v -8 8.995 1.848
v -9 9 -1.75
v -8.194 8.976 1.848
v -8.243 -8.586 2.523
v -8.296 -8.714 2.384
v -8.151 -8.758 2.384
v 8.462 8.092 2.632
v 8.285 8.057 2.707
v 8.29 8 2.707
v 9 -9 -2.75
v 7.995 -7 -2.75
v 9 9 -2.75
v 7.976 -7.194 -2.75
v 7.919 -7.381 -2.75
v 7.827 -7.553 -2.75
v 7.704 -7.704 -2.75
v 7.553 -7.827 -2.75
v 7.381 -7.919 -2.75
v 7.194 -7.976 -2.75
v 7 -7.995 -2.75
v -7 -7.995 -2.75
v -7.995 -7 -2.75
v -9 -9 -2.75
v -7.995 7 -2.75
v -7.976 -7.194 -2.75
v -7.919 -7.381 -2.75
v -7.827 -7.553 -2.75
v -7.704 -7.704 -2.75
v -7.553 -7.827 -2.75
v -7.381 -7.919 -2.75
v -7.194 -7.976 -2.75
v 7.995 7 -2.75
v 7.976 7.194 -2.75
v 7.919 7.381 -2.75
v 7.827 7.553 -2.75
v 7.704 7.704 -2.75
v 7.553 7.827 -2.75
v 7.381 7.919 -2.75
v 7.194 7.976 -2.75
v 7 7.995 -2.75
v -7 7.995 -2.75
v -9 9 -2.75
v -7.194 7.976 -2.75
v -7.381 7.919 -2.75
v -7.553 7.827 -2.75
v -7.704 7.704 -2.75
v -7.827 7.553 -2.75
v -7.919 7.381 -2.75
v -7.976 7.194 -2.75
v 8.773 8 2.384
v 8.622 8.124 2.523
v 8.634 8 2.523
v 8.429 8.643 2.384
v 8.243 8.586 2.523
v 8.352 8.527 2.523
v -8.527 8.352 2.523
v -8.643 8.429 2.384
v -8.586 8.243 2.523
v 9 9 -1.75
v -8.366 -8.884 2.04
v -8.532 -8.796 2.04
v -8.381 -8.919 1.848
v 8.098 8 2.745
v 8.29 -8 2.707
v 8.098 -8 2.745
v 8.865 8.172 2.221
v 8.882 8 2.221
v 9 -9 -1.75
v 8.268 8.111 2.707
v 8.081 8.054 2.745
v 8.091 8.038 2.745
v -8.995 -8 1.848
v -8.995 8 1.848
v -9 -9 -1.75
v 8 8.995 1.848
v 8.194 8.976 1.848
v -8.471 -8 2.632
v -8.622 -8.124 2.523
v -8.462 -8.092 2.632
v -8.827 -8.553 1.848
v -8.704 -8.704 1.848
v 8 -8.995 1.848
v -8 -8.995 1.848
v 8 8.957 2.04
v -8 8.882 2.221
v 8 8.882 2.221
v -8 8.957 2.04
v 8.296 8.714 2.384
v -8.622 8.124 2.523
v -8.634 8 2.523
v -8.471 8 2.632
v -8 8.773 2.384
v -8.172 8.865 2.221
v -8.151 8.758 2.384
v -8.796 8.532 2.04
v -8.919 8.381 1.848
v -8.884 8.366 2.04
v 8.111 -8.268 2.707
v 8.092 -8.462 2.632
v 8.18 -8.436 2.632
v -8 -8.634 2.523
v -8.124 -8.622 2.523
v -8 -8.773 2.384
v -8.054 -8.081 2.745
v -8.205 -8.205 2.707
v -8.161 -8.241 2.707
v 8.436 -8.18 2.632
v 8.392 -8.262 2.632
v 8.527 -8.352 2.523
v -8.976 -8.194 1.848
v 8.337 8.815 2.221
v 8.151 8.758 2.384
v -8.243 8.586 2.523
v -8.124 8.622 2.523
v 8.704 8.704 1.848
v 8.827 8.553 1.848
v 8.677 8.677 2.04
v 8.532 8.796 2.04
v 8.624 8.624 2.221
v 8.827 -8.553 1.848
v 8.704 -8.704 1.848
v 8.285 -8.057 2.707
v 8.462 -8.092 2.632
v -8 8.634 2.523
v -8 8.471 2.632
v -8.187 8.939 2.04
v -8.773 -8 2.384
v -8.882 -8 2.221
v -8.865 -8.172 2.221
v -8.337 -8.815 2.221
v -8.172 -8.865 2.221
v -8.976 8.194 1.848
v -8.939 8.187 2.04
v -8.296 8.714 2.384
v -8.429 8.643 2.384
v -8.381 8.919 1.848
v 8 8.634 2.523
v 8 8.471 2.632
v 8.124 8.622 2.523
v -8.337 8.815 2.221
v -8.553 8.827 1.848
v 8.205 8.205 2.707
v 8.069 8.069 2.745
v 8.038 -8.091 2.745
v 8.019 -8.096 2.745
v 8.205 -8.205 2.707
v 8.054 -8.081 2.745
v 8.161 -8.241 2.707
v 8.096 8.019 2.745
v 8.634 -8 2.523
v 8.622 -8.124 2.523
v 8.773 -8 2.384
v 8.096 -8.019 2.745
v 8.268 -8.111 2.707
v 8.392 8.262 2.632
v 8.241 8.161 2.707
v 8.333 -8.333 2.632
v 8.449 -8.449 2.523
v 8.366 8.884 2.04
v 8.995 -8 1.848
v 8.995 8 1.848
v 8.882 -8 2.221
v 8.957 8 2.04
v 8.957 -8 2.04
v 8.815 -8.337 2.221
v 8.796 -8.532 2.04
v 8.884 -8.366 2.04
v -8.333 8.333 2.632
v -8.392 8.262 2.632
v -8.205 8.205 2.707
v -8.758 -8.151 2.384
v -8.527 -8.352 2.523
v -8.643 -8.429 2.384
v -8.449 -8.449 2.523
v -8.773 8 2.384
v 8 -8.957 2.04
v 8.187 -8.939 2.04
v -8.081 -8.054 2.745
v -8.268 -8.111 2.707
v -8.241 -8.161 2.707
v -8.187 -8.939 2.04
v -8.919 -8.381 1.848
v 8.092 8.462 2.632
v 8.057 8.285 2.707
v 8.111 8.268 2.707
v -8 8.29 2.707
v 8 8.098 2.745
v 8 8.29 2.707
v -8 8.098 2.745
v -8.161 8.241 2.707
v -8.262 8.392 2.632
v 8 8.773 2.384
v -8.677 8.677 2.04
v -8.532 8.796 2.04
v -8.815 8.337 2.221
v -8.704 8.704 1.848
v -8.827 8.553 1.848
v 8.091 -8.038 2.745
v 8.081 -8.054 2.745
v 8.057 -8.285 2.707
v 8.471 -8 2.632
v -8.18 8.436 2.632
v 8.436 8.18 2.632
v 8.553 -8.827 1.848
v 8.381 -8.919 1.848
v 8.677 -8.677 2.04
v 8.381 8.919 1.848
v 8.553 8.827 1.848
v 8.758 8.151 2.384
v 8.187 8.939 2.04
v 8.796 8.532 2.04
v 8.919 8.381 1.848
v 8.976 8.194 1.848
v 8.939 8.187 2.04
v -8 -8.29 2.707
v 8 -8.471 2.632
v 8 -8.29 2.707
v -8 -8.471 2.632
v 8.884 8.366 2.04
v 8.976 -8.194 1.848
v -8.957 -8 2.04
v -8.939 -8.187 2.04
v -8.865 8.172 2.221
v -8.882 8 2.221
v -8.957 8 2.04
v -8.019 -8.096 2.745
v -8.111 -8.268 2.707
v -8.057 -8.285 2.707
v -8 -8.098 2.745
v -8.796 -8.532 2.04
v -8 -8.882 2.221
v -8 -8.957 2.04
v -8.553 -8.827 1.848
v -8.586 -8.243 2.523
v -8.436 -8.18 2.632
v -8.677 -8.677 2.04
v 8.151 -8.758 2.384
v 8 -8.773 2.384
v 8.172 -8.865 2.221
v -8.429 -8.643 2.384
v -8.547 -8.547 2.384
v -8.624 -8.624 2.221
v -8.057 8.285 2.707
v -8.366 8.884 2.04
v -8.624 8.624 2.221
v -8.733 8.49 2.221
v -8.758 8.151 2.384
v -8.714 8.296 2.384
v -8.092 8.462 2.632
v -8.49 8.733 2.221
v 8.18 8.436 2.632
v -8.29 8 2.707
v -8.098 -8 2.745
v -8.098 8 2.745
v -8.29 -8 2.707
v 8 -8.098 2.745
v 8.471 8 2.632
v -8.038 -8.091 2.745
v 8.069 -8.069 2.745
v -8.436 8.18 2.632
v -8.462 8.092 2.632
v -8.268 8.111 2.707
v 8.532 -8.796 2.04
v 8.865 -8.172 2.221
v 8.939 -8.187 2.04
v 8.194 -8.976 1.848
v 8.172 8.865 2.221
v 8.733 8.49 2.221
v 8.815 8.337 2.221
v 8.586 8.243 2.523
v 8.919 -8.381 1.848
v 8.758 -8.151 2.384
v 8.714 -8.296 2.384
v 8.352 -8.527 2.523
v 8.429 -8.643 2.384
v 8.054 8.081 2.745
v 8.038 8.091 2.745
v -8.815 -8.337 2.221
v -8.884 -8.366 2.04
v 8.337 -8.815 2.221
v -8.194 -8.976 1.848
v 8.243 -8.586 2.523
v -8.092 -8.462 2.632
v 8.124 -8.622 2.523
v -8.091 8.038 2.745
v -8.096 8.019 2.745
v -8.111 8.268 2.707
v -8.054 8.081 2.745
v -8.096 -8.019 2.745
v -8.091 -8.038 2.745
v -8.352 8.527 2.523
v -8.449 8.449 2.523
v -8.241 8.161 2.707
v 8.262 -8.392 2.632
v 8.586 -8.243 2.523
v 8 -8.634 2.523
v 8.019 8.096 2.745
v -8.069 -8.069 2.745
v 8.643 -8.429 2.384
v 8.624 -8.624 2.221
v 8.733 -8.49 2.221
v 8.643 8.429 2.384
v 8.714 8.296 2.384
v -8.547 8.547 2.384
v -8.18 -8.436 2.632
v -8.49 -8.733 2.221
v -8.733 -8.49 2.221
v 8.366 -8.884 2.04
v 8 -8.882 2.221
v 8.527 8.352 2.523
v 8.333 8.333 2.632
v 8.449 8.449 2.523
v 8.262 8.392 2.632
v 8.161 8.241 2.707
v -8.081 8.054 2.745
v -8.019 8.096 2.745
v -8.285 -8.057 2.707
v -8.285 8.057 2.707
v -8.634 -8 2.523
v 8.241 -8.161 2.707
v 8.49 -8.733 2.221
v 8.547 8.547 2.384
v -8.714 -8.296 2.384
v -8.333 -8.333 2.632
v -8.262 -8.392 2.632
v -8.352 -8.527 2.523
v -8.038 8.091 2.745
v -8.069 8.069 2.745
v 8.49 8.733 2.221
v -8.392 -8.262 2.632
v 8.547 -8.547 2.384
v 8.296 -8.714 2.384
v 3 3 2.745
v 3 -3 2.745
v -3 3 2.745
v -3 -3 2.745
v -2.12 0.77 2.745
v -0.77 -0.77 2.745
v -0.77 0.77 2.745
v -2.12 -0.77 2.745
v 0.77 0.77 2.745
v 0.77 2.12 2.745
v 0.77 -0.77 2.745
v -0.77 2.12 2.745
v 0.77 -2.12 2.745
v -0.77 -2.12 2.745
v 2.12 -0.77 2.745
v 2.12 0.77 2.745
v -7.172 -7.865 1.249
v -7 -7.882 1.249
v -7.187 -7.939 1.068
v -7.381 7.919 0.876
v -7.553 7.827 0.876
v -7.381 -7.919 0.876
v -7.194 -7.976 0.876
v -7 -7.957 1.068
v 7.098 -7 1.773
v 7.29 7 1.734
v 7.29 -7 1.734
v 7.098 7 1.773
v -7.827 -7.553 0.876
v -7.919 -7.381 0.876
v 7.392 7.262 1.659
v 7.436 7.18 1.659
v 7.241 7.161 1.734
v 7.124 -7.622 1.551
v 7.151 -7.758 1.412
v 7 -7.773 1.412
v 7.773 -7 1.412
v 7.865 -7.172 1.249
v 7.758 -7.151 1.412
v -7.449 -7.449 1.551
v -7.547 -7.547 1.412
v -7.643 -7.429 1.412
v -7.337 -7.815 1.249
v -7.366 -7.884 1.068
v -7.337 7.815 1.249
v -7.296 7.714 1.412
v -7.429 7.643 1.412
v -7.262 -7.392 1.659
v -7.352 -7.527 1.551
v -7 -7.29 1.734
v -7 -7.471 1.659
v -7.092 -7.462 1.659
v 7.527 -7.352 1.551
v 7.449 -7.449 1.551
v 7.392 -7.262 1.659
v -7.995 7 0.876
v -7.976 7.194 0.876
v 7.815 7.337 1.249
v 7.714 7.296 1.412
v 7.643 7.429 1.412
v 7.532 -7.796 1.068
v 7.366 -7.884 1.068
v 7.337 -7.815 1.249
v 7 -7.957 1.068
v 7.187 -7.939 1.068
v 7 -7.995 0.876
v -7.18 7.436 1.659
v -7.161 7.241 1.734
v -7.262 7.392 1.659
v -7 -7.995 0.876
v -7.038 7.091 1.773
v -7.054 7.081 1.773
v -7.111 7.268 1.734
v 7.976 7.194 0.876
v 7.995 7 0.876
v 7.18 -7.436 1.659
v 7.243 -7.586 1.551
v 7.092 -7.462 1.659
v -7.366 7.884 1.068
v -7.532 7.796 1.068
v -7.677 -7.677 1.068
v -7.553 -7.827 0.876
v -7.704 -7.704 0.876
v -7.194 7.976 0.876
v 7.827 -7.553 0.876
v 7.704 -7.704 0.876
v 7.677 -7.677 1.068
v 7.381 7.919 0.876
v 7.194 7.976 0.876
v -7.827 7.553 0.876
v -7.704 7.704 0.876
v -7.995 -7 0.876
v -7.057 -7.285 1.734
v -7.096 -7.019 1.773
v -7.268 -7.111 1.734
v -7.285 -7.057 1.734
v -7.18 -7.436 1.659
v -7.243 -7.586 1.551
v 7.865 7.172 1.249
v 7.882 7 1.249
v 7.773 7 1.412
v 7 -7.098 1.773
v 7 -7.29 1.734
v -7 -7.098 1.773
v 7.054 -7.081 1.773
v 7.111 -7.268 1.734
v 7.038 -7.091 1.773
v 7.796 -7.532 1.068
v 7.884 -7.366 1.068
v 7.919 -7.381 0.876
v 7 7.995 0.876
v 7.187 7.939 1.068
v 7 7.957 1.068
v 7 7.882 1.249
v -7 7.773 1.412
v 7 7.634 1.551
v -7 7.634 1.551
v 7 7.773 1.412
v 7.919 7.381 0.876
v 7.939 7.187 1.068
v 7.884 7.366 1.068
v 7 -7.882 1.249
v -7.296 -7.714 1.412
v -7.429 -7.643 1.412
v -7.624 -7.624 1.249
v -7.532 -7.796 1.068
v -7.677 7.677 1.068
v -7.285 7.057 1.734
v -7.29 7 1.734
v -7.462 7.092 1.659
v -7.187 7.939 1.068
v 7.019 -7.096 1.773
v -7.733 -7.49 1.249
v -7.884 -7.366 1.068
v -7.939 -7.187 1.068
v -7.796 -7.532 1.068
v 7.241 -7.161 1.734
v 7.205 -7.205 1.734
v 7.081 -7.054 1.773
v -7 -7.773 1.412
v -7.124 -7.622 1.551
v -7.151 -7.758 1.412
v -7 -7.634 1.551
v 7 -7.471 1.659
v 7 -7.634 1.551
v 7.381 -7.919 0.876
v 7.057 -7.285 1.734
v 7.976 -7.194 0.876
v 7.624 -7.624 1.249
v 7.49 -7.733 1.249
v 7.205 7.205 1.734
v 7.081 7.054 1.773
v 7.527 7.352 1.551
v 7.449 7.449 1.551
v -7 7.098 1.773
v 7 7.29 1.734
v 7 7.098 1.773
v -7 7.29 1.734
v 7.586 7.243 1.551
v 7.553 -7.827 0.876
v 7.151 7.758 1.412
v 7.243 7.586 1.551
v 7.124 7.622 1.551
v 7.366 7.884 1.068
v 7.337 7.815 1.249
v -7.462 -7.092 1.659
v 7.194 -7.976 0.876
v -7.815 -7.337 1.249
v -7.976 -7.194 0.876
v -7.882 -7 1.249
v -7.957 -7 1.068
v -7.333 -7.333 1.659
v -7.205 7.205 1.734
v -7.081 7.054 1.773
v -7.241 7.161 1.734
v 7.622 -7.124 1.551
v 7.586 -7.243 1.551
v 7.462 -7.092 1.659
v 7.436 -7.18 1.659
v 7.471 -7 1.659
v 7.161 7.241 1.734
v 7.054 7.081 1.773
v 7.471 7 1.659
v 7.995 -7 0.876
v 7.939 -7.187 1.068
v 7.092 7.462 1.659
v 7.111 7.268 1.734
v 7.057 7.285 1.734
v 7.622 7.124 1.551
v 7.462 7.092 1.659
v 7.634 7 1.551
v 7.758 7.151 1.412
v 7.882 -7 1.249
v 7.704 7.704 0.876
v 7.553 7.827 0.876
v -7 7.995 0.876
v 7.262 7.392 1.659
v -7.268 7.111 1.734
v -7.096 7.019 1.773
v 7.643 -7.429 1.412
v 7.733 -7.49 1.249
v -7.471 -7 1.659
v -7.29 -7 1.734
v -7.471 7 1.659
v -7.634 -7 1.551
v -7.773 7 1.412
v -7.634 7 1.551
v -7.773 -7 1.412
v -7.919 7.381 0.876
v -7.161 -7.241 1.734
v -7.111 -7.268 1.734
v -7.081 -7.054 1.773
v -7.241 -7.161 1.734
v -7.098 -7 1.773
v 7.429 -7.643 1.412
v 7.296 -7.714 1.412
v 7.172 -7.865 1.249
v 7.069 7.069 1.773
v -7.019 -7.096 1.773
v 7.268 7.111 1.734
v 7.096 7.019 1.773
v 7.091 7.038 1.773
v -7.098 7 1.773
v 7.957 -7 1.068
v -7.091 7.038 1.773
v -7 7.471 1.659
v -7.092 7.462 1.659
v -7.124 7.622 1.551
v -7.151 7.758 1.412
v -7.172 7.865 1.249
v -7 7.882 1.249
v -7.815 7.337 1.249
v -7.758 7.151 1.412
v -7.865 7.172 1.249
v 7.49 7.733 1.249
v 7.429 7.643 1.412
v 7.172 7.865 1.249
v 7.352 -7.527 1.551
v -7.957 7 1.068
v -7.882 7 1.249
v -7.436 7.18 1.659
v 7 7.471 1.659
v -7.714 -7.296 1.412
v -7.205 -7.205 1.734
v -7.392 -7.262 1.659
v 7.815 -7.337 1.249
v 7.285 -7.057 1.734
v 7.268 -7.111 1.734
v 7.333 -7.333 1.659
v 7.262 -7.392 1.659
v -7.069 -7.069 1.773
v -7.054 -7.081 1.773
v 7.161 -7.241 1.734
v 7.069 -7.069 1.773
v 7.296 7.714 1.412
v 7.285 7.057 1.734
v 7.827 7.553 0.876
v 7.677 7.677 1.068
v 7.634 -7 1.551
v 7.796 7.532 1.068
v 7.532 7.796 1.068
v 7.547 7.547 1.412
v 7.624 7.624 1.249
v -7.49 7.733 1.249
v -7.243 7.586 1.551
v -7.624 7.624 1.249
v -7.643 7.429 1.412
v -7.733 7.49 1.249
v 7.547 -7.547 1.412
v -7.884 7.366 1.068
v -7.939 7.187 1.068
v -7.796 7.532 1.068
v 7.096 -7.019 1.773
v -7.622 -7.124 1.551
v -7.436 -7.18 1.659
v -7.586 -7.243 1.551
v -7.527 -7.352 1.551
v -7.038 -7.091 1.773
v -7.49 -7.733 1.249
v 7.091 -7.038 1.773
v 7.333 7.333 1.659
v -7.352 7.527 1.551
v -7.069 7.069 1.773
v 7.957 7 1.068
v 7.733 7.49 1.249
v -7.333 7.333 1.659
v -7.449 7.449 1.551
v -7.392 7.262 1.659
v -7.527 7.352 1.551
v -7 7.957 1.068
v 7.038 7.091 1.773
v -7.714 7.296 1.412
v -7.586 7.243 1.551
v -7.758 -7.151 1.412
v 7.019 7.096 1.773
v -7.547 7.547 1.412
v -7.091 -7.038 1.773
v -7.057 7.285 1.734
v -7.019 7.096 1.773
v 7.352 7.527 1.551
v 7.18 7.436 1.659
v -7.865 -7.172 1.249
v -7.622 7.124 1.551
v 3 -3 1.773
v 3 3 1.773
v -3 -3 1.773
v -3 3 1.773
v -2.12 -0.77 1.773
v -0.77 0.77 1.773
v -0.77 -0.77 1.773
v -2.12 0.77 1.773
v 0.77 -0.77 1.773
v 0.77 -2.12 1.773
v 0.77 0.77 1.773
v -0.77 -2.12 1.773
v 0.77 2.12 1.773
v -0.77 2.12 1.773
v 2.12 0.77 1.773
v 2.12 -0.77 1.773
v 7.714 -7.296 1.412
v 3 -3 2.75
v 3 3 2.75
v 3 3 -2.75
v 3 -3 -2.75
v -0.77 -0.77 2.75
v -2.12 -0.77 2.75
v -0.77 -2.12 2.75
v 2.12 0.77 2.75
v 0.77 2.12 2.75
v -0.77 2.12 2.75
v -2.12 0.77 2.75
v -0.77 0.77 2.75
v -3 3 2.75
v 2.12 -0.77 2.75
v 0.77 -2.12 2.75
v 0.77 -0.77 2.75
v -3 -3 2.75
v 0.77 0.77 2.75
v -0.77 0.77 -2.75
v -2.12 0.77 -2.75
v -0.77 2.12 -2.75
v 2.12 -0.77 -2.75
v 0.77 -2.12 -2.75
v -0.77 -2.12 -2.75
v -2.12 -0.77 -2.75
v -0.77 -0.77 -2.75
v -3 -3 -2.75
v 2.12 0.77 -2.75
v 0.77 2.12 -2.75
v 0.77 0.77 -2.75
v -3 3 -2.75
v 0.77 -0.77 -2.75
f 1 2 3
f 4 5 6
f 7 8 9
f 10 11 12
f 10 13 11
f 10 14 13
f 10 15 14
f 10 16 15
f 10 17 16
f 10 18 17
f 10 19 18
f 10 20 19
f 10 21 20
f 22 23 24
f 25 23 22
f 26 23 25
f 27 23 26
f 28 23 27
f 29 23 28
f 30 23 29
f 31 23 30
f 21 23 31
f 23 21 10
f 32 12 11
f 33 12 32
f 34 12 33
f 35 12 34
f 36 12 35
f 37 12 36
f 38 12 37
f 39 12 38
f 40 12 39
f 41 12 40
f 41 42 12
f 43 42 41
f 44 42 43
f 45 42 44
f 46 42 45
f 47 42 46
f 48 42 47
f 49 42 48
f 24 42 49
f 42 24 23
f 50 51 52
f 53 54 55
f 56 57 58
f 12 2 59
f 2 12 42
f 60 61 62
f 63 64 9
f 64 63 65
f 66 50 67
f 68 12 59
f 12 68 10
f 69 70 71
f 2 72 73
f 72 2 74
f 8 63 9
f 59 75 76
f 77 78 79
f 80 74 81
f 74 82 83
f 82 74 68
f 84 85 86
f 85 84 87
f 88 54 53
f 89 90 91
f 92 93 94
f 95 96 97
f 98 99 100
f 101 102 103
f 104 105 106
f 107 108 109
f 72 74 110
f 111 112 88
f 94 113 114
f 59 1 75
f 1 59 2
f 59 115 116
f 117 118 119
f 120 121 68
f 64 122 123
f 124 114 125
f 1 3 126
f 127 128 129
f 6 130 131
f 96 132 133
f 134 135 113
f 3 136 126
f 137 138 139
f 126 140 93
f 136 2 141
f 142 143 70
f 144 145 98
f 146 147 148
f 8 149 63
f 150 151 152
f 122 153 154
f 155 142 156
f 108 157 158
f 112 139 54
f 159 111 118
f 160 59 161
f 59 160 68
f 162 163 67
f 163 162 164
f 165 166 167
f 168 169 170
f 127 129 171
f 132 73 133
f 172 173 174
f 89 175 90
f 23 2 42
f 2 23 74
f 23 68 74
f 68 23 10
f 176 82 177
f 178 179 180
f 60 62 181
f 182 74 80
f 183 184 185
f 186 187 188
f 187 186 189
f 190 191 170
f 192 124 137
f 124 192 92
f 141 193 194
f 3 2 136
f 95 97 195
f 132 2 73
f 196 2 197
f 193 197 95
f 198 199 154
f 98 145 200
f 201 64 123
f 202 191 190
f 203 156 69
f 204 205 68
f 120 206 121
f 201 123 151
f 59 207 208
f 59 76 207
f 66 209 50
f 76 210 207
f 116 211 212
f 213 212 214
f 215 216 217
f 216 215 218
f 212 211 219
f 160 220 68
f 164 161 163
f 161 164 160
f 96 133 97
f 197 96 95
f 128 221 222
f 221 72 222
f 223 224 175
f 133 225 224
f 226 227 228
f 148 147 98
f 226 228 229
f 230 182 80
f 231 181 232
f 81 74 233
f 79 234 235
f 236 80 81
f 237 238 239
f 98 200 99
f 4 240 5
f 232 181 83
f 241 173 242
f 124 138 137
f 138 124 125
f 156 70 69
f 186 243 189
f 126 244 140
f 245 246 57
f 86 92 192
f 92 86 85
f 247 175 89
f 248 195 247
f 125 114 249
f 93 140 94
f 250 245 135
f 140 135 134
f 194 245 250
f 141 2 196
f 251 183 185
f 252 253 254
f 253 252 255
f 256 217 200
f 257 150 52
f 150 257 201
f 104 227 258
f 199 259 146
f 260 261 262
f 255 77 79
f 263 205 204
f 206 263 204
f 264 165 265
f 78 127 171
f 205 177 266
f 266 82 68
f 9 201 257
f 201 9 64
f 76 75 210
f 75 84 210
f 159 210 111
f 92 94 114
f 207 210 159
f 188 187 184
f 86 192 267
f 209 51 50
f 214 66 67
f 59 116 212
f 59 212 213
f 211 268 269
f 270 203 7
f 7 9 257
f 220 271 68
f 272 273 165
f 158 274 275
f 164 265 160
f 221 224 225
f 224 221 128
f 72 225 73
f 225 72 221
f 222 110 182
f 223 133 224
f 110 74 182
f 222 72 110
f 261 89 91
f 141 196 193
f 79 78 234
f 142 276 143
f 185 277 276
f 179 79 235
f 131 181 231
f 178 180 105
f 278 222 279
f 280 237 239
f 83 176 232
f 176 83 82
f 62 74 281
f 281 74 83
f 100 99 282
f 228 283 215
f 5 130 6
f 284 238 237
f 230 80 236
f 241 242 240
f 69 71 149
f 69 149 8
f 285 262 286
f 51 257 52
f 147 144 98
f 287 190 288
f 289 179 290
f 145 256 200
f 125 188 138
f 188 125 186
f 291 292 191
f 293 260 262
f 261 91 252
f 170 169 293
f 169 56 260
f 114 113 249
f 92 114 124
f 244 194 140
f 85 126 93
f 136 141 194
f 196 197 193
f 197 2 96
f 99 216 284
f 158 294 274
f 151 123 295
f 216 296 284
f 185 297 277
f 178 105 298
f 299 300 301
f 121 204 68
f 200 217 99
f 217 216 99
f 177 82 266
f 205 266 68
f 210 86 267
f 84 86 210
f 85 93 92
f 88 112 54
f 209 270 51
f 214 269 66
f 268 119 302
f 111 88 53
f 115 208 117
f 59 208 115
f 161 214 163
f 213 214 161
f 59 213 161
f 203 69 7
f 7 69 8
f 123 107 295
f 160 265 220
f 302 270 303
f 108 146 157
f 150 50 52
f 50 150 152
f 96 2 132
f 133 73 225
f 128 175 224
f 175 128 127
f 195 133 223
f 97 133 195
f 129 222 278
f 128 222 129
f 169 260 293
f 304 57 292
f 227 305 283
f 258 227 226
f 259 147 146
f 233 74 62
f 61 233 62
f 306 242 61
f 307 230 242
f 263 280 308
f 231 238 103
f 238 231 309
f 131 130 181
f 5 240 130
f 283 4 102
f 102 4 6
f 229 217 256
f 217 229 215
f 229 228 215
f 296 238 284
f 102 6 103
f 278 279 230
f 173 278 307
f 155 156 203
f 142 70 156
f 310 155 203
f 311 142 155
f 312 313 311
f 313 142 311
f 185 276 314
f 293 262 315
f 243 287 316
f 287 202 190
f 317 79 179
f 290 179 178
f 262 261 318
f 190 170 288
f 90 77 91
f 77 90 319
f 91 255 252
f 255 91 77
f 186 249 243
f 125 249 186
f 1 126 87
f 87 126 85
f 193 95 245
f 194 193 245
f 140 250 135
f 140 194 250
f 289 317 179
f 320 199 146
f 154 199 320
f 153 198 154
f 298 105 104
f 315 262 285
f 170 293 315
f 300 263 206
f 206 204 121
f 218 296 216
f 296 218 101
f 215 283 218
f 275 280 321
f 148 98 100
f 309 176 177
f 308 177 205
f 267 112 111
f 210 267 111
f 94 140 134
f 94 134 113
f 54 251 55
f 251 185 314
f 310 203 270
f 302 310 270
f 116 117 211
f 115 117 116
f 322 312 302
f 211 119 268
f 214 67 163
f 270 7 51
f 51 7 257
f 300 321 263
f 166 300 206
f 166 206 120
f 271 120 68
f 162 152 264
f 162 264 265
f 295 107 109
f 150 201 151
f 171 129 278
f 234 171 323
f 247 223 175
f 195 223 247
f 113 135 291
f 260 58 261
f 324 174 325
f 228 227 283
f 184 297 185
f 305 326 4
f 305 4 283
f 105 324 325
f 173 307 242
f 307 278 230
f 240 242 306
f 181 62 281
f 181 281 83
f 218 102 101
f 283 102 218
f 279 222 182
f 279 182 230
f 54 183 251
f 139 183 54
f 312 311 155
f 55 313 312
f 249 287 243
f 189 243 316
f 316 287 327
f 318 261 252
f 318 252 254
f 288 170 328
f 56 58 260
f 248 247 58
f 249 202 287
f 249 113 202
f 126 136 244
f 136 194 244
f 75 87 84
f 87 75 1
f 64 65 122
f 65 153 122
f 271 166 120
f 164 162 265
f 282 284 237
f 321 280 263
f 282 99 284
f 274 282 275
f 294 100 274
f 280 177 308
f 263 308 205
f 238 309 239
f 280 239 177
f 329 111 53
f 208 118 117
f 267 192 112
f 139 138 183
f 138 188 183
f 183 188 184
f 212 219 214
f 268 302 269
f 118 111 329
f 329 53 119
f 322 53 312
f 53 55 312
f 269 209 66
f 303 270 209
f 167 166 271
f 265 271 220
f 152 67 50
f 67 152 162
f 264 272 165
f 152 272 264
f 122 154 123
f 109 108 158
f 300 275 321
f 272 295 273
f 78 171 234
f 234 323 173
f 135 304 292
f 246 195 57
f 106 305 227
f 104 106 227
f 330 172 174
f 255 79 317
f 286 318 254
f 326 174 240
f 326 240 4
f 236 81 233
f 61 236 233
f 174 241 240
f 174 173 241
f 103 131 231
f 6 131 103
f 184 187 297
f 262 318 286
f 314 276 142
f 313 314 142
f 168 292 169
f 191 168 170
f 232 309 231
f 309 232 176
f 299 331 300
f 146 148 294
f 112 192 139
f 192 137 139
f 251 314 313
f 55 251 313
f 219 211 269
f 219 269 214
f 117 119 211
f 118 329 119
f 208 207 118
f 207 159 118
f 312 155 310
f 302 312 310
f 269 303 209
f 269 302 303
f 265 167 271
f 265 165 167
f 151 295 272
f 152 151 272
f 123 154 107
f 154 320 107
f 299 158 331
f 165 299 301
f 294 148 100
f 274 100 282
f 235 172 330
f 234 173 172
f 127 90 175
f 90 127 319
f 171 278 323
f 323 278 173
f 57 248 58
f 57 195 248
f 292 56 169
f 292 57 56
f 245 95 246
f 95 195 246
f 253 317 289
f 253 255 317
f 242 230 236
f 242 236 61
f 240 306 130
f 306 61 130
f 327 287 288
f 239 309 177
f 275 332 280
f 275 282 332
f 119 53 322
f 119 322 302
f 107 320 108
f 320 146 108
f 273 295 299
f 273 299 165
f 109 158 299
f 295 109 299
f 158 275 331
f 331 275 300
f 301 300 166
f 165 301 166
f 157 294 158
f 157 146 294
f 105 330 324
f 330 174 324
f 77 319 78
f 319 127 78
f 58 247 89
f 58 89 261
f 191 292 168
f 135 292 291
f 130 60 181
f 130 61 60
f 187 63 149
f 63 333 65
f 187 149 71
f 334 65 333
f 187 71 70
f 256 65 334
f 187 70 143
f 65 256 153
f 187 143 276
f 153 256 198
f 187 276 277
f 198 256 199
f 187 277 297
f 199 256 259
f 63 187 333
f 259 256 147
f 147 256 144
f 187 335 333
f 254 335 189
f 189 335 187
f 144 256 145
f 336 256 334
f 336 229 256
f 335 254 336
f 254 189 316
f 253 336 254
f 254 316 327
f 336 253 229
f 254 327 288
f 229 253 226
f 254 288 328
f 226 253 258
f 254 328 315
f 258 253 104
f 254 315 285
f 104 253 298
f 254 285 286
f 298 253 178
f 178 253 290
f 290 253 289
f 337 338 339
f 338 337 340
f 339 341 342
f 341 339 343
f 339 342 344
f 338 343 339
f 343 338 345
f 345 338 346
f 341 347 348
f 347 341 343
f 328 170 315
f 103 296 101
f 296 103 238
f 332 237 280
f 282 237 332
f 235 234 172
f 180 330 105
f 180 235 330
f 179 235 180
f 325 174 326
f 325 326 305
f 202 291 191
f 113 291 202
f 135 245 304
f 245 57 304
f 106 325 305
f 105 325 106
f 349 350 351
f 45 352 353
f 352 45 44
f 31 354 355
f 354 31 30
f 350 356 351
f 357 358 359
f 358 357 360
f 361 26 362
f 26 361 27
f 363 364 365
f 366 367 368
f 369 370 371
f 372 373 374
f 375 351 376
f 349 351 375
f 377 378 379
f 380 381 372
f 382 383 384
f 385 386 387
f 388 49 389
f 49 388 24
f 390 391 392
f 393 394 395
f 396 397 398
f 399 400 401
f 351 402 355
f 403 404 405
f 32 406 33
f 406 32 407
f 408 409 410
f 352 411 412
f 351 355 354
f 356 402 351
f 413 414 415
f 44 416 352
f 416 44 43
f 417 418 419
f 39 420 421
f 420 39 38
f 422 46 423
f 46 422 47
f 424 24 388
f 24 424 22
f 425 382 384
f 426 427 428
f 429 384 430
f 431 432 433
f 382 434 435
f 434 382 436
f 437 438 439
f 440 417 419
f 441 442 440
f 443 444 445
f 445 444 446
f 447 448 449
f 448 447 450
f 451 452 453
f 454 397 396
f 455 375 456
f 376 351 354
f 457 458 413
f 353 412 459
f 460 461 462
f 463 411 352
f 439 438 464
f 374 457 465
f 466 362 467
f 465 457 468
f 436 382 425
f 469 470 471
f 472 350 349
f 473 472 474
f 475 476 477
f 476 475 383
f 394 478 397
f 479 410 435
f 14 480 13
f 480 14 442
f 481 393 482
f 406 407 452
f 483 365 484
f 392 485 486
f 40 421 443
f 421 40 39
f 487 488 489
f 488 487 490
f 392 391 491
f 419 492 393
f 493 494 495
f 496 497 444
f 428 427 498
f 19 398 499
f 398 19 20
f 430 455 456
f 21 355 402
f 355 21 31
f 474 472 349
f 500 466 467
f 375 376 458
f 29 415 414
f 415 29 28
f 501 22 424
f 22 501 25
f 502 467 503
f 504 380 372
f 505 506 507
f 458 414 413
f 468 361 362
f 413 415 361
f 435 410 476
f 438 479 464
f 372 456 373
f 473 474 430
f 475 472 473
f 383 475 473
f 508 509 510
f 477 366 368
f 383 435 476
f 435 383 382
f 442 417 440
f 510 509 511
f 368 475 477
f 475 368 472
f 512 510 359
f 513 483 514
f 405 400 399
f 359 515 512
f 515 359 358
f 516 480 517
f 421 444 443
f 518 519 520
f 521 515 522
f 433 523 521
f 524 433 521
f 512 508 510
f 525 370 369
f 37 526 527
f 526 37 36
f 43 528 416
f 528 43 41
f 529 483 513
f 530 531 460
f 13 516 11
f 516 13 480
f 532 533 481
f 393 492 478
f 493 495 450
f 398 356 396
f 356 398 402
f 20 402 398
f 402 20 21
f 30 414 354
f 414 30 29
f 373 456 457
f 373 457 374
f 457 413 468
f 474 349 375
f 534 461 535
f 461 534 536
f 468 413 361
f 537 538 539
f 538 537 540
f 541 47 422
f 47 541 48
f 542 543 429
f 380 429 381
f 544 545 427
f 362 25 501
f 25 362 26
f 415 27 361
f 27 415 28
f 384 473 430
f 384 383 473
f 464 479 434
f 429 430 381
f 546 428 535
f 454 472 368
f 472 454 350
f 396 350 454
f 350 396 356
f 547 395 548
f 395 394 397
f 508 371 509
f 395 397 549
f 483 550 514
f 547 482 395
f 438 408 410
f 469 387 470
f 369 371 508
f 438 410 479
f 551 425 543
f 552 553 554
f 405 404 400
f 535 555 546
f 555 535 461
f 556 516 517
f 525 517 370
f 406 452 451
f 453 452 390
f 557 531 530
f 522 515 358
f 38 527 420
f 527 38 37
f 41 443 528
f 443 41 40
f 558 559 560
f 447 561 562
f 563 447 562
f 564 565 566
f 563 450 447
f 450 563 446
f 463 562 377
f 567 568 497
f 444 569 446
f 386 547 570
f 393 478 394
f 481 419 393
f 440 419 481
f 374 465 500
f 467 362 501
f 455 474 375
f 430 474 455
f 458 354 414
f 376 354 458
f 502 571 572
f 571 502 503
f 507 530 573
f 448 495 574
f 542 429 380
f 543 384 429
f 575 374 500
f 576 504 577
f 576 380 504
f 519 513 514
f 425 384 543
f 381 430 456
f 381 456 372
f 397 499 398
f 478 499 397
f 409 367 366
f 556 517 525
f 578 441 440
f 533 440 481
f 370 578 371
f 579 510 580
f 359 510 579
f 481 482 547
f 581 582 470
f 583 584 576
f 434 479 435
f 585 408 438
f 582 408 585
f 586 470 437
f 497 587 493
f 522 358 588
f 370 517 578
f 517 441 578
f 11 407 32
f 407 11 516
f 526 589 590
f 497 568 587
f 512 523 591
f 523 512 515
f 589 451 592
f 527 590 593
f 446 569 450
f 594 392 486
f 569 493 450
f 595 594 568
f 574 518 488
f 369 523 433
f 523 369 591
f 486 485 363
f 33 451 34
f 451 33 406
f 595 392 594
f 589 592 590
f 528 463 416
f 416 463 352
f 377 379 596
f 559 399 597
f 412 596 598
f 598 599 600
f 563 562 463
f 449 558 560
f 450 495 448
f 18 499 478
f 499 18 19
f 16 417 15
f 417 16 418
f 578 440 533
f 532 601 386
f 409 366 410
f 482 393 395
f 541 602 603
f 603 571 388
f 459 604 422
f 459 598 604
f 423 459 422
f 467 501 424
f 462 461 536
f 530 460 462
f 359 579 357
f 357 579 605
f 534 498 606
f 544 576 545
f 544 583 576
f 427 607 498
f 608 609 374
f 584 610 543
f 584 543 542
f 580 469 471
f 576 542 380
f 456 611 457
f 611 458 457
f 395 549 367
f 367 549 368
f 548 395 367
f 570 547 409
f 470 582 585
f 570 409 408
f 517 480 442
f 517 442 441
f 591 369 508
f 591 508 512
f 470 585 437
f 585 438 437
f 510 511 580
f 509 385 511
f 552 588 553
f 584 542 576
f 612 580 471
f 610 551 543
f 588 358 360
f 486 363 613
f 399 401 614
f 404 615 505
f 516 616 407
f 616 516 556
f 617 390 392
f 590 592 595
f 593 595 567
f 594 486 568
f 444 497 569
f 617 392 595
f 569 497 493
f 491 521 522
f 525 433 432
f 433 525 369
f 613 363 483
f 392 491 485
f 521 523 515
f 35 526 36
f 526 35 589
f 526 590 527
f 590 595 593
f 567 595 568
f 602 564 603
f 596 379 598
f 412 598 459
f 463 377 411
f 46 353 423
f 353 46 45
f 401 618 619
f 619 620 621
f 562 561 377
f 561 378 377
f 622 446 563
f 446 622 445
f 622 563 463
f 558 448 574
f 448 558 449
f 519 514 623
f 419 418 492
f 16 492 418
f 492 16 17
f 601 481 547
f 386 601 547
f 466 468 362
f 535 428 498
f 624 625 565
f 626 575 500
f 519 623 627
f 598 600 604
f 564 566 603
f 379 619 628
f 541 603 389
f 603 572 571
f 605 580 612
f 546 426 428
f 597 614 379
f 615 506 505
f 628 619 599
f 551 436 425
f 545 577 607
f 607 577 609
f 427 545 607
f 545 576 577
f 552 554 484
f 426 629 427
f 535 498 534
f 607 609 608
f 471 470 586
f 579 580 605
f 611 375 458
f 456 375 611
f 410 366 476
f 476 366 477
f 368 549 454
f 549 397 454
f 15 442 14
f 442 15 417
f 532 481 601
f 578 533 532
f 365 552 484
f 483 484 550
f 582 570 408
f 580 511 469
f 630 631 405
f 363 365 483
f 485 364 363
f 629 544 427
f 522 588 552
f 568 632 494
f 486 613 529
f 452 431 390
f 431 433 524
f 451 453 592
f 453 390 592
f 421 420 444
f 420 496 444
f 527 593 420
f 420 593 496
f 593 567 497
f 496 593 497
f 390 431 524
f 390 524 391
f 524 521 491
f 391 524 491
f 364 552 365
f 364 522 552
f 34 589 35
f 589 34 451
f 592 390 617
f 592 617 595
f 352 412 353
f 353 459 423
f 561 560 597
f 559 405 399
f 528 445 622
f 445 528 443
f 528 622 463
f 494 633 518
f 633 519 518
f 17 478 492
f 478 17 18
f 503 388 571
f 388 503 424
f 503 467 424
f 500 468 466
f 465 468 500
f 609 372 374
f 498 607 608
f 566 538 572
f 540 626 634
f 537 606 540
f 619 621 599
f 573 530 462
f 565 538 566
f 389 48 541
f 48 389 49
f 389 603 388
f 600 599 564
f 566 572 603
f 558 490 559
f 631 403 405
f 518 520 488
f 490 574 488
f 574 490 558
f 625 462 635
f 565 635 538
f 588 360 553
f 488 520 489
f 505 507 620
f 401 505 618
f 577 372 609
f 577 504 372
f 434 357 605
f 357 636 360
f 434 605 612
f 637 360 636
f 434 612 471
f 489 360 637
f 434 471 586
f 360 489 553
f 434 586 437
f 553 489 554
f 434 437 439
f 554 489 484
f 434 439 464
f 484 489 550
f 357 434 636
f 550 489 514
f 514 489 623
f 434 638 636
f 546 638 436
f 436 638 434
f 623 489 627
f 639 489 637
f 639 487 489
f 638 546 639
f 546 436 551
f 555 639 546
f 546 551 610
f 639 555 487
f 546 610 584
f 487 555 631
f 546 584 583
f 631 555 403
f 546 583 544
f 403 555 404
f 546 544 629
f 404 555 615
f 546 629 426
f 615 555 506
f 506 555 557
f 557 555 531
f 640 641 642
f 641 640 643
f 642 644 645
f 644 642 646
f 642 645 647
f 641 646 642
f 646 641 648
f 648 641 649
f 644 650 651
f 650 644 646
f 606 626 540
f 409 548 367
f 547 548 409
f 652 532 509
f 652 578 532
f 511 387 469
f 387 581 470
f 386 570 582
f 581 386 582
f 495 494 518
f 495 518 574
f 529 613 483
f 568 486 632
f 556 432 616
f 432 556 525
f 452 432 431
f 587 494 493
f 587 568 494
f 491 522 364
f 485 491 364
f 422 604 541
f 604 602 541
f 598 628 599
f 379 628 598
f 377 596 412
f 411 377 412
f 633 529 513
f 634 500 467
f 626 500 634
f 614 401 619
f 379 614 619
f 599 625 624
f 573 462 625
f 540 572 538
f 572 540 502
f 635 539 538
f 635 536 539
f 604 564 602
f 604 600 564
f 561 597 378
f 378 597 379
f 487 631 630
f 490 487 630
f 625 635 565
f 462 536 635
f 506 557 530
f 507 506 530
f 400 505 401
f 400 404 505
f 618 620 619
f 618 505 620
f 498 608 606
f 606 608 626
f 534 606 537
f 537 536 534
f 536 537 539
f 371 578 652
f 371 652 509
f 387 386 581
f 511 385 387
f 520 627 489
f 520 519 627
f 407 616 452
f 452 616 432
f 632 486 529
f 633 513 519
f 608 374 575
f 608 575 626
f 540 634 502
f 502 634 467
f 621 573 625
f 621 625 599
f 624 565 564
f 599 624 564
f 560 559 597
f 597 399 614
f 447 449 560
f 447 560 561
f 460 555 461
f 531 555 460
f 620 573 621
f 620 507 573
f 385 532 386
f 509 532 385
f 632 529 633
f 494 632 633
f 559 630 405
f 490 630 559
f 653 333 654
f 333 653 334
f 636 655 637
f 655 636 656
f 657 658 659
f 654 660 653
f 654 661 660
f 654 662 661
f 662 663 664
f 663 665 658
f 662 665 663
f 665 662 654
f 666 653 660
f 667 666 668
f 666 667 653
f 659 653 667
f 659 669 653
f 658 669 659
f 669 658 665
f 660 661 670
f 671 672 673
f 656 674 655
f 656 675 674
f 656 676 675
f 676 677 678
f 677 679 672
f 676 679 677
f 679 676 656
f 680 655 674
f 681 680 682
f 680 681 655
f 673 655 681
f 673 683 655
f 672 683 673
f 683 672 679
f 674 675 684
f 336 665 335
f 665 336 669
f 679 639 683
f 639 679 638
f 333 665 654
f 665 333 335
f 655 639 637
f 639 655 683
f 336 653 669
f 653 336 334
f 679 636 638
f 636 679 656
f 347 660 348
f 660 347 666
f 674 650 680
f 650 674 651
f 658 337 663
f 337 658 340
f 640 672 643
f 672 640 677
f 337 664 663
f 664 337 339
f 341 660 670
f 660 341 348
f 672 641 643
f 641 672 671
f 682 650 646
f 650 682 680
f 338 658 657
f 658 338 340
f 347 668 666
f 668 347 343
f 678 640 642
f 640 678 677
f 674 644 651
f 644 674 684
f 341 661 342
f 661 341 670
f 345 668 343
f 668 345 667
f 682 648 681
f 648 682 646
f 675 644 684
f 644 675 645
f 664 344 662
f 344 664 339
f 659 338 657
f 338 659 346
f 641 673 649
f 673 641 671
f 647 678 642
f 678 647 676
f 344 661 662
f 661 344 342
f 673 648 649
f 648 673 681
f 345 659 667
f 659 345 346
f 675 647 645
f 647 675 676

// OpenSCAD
union() // SharpSCAD generated scene: test
{
  { // module: keycap
    union()
    {
      difference()
      {
        { // module: roundedcube
          translate( v= [ -9, -9, -2.75 ] )
          {
            translate( v= [ 0, 0, 0 ] )
            {
              hull()
              {
                translate( v= [ 1, 1, 1 ] )
                {
                  sphere( r= 1, $fn= 32 );
                }
                translate( v= [ 1, 17, 1 ] )
                {
                  sphere( r= 1, $fn= 32 );
                }
                translate( v= [ 1, 1, 4.5 ] )
                {
                  sphere( r= 1, $fn= 32 );
                }
                translate( v= [ 1, 17, 4.5 ] )
                {
                  sphere( r= 1, $fn= 32 );
                }
                translate( v= [ 17, 1, 1 ] )
                {
                  sphere( r= 1, $fn= 32 );
                }
                translate( v= [ 17, 17, 1 ] )
                {
                  sphere( r= 1, $fn= 32 );
                }
                translate( v= [ 17, 1, 4.5 ] )
                {
                  sphere( r= 1, $fn= 32 );
                }
                translate( v= [ 17, 17, 4.5 ] )
                {
                  sphere( r= 1, $fn= 32 );
                }
                union()
                {
                  cube( size= [ 18, 18, 1 ] );
                }
              }
            }
          }
        }
        translate( v= [ 0, 0, -1 ] )
        {
          { // module: roundedcube
            translate( v= [ -8, -8, -2.7775 ] )
            {
              translate( v= [ 0, 0, 0 ] )
              {
                hull()
                {
                  translate( v= [ 1, 1, 1 ] )
                  {
                    sphere( r= 1, $fn= 32 );
                  }
                  translate( v= [ 1, 15, 1 ] )
                  {
                    sphere( r= 1, $fn= 32 );
                  }
                  translate( v= [ 1, 1, 4.555 ] )
                  {
                    sphere( r= 1, $fn= 32 );
                  }
                  translate( v= [ 1, 15, 4.555 ] )
                  {
                    sphere( r= 1, $fn= 32 );
                  }
                  translate( v= [ 15, 1, 1 ] )
                  {
                    sphere( r= 1, $fn= 32 );
                  }
                  translate( v= [ 15, 15, 1 ] )
                  {
                    sphere( r= 1, $fn= 32 );
                  }
                  translate( v= [ 15, 1, 4.555 ] )
                  {
                    sphere( r= 1, $fn= 32 );
                  }
                  translate( v= [ 15, 15, 4.555 ] )
                  {
                    sphere( r= 1, $fn= 32 );
                  }
                  union()
                  {
                  }
                }
              }
            }
          }
        }
      }
      difference()
      {
        cube( size= [ 6, 6, 5.5 ], center= true );
        cube( size= [ 4.24, 1.54, 10 ], center= true );
        cube( size= [ 1.54, 4.24, 10 ], center= true );
      }
    }
  }
}
